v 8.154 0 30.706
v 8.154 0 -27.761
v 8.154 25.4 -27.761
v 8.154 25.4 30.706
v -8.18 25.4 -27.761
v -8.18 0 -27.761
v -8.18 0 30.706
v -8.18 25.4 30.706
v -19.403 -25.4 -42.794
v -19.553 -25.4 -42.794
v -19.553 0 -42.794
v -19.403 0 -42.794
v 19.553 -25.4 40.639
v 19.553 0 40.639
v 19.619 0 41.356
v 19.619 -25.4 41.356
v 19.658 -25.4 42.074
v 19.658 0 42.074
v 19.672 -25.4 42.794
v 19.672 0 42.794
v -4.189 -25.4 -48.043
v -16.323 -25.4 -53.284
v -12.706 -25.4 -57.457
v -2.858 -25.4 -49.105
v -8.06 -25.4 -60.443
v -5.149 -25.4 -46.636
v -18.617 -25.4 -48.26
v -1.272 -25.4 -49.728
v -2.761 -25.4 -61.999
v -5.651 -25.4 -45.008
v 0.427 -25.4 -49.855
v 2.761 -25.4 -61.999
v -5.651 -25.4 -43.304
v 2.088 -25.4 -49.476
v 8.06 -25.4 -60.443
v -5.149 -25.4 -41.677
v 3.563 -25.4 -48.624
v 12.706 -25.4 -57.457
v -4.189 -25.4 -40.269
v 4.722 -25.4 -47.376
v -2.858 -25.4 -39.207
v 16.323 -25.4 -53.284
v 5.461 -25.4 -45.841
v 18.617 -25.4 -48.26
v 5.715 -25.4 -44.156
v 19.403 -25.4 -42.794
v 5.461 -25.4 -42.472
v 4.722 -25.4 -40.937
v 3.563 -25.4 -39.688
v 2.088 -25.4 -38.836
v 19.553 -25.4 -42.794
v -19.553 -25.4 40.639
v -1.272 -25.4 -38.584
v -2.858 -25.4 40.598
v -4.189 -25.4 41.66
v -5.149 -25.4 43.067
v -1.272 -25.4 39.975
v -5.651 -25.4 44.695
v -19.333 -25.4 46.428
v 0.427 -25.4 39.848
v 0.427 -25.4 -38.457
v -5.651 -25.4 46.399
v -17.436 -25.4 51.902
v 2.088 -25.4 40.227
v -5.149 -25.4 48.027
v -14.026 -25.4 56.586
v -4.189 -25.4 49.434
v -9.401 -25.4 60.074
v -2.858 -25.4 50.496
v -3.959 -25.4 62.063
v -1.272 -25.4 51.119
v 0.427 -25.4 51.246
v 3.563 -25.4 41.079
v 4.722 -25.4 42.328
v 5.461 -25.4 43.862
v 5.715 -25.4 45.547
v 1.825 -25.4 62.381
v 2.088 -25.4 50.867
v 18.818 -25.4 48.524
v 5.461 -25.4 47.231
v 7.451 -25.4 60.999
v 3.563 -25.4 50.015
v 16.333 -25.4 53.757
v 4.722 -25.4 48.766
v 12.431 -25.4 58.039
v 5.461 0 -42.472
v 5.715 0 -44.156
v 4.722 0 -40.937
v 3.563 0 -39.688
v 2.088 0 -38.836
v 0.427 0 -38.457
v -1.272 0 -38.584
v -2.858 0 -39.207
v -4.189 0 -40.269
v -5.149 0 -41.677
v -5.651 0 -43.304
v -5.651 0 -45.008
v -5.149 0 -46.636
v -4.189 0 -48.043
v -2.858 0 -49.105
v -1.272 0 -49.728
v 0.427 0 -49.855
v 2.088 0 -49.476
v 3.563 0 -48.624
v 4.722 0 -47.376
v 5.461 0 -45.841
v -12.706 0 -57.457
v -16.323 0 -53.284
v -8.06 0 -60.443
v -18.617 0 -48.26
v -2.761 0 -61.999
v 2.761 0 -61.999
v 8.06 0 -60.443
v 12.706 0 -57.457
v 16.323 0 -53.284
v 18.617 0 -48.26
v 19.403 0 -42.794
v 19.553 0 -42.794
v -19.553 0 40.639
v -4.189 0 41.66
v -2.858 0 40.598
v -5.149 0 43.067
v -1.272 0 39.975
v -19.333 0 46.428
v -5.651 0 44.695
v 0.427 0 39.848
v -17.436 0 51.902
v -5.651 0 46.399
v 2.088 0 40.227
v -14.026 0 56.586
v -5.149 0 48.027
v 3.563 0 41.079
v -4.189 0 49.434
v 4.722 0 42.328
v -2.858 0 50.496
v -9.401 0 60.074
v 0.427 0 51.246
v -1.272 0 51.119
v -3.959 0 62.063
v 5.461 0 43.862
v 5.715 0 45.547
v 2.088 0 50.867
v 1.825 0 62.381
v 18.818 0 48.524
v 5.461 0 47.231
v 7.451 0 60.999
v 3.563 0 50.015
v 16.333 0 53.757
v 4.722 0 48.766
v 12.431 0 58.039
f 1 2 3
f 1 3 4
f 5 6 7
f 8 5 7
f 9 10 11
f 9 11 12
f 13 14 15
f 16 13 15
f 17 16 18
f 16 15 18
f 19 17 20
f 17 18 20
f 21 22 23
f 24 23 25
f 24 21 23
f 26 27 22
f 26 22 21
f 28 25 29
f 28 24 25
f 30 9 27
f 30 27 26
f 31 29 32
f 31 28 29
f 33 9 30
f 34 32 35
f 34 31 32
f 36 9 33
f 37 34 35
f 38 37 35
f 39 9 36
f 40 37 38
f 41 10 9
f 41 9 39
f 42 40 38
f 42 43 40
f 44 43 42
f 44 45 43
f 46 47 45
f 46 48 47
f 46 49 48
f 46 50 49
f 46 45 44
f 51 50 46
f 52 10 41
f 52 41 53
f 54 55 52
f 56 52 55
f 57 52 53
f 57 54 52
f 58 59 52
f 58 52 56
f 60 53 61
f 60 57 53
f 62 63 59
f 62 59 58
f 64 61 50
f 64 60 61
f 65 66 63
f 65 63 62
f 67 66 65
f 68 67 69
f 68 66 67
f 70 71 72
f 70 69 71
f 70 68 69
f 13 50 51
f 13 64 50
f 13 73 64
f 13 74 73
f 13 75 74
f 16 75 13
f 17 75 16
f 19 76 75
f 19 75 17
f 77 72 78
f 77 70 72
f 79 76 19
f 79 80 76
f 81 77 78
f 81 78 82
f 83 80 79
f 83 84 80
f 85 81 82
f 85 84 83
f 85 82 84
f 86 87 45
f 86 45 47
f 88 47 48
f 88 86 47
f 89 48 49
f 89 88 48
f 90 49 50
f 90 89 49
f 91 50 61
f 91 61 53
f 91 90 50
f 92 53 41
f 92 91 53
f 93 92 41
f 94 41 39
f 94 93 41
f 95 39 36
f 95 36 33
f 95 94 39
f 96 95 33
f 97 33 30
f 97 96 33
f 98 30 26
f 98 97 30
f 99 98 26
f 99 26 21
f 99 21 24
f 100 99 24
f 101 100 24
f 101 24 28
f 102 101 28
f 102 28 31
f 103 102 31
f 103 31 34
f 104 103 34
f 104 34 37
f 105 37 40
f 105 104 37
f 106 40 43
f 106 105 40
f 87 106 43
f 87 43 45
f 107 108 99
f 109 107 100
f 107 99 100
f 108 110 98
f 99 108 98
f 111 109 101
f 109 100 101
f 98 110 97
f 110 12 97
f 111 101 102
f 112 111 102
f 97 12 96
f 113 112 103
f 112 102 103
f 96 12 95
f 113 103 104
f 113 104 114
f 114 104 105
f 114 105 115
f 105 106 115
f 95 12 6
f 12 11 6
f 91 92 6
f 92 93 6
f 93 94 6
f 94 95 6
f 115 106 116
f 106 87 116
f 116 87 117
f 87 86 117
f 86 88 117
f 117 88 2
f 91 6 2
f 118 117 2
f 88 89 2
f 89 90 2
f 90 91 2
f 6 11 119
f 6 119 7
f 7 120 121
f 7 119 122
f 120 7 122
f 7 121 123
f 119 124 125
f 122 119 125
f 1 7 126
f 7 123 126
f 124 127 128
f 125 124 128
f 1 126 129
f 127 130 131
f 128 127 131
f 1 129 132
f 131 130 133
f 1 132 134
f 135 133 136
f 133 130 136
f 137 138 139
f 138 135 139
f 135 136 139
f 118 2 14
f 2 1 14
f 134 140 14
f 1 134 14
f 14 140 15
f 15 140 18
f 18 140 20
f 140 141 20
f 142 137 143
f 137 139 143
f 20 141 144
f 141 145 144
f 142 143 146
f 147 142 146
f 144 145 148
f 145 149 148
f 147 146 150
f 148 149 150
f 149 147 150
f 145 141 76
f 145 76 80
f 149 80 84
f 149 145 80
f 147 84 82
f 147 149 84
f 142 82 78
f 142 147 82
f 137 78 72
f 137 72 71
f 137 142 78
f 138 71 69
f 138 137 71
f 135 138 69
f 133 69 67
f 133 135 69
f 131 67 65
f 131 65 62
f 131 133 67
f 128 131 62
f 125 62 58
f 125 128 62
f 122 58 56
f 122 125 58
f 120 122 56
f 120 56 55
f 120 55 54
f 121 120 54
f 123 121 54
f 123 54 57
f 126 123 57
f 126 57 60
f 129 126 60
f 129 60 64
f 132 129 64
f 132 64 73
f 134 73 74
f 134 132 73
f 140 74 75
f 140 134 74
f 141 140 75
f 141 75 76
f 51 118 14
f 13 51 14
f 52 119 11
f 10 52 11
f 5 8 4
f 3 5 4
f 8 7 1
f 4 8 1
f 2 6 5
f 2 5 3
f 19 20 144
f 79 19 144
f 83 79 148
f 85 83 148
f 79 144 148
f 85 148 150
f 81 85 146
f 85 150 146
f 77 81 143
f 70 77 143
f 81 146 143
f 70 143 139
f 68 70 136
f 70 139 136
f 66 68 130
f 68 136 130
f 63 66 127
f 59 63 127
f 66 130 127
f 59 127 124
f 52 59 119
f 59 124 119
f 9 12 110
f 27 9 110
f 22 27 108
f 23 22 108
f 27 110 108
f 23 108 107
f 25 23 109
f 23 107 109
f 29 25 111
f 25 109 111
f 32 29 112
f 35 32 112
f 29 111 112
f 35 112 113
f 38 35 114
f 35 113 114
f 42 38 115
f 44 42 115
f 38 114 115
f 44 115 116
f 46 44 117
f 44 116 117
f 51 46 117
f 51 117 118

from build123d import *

# Parameters (mm, degrees)
F1_DEPTH = 25.4
F2_R     = 5.715
F3_DEPTH = 25.4
F4_W     = 16.3346650079
F4_H     = 58.4679208696
F5_DEPTH = 25.4


with BuildPart() as f1:
    # F0 (on Front) → F1 (new body)
    with BuildSketch(Plane.XZ):
        with BuildLine():
            Line((-19.5532236248, 40.6393535502), (-19.5532236248, 42.7938178182))
            Line((-19.5532236248, 42.7938178182), (19.5532236248, 42.7938178182))
            Line((19.5532236248, 42.7938178182), (19.5532236248, 40.6393535502))
            ThreePointArc((19.5532236248, 40.6393535502), (19.6419535806, 41.7149619699), (19.6715599383, 42.7938178182))
            ThreePointArc((19.6715599383, 42.7938178182), (-1.0788558483, 62.4357713988), (-19.5532236248, 40.6393535502))
        make_face()
        with BuildLine():
            Line((19.5532236248, 42.7938178182), (-19.5532236248, 42.7938178182))
            Line((-19.5532236248, 42.7938178182), (-19.5532236248, 40.6393535502))
            ThreePointArc((-19.5532236248, 40.6393535502), (0, 23.1222578799), (19.5532236248, 40.6393535502))
            Line((19.5532236248, 40.6393535502), (19.5532236248, 42.7938178182))
        make_face()
        with BuildLine():
            ThreePointArc((19.5532236248, 40.6393535502), (0, 23.1222578799), (-19.5532236248, 40.6393535502))
            Line((-19.5532236248, 40.6393535502), (-19.5532236248, -42.7938178182))
            Line((-19.5532236248, -42.7938178182), (-19.4028248978, -42.7938178182))
            ThreePointArc((-19.4028248978, -42.7938178182), (0, -23.3909929204), (19.4028248978, -42.7938178182))
            Line((19.4028248978, -42.7938178182), (19.5532236248, -42.7938178182))
            Line((19.5532236248, -42.7938178182), (19.5532236248, 40.6393535502))
        make_face()
        with BuildLine():
            ThreePointArc((19.4028248978, -42.7938178182), (0, -23.3909929204), (-19.4028248978, -42.7938178182))
            Line((-19.4028248978, -42.7938178182), (19.4028248978, -42.7938178182))
        make_face()
        with BuildLine():
            Line((19.4028248978, -42.7938178182), (-19.4028248978, -42.7938178182))
            ThreePointArc((-19.4028248978, -42.7938178182), (0, -62.196642716), (19.4028248978, -42.7938178182))
        make_face()
    extrude(amount=F1_DEPTH)

    # F2 (on Front) → F3 (cut)
    with BuildSketch(Plane.XZ):
        with Locations((0, 45.5469058133)):
            Circle(F2_R)
        with Locations((0, -44.1561616667)):
            Circle(F2_R)
    extrude(amount=F3_DEPTH, mode=Mode.SUBTRACT)

    # F4 (on Front) → F5 (join)
    with BuildSketch(Plane.XZ):
        with Locations((-0.0131181441, 1.4724824578)):
            Rectangle(F4_W, F4_H)
    extrude(amount=-F5_DEPTH)


solid = f1.part
